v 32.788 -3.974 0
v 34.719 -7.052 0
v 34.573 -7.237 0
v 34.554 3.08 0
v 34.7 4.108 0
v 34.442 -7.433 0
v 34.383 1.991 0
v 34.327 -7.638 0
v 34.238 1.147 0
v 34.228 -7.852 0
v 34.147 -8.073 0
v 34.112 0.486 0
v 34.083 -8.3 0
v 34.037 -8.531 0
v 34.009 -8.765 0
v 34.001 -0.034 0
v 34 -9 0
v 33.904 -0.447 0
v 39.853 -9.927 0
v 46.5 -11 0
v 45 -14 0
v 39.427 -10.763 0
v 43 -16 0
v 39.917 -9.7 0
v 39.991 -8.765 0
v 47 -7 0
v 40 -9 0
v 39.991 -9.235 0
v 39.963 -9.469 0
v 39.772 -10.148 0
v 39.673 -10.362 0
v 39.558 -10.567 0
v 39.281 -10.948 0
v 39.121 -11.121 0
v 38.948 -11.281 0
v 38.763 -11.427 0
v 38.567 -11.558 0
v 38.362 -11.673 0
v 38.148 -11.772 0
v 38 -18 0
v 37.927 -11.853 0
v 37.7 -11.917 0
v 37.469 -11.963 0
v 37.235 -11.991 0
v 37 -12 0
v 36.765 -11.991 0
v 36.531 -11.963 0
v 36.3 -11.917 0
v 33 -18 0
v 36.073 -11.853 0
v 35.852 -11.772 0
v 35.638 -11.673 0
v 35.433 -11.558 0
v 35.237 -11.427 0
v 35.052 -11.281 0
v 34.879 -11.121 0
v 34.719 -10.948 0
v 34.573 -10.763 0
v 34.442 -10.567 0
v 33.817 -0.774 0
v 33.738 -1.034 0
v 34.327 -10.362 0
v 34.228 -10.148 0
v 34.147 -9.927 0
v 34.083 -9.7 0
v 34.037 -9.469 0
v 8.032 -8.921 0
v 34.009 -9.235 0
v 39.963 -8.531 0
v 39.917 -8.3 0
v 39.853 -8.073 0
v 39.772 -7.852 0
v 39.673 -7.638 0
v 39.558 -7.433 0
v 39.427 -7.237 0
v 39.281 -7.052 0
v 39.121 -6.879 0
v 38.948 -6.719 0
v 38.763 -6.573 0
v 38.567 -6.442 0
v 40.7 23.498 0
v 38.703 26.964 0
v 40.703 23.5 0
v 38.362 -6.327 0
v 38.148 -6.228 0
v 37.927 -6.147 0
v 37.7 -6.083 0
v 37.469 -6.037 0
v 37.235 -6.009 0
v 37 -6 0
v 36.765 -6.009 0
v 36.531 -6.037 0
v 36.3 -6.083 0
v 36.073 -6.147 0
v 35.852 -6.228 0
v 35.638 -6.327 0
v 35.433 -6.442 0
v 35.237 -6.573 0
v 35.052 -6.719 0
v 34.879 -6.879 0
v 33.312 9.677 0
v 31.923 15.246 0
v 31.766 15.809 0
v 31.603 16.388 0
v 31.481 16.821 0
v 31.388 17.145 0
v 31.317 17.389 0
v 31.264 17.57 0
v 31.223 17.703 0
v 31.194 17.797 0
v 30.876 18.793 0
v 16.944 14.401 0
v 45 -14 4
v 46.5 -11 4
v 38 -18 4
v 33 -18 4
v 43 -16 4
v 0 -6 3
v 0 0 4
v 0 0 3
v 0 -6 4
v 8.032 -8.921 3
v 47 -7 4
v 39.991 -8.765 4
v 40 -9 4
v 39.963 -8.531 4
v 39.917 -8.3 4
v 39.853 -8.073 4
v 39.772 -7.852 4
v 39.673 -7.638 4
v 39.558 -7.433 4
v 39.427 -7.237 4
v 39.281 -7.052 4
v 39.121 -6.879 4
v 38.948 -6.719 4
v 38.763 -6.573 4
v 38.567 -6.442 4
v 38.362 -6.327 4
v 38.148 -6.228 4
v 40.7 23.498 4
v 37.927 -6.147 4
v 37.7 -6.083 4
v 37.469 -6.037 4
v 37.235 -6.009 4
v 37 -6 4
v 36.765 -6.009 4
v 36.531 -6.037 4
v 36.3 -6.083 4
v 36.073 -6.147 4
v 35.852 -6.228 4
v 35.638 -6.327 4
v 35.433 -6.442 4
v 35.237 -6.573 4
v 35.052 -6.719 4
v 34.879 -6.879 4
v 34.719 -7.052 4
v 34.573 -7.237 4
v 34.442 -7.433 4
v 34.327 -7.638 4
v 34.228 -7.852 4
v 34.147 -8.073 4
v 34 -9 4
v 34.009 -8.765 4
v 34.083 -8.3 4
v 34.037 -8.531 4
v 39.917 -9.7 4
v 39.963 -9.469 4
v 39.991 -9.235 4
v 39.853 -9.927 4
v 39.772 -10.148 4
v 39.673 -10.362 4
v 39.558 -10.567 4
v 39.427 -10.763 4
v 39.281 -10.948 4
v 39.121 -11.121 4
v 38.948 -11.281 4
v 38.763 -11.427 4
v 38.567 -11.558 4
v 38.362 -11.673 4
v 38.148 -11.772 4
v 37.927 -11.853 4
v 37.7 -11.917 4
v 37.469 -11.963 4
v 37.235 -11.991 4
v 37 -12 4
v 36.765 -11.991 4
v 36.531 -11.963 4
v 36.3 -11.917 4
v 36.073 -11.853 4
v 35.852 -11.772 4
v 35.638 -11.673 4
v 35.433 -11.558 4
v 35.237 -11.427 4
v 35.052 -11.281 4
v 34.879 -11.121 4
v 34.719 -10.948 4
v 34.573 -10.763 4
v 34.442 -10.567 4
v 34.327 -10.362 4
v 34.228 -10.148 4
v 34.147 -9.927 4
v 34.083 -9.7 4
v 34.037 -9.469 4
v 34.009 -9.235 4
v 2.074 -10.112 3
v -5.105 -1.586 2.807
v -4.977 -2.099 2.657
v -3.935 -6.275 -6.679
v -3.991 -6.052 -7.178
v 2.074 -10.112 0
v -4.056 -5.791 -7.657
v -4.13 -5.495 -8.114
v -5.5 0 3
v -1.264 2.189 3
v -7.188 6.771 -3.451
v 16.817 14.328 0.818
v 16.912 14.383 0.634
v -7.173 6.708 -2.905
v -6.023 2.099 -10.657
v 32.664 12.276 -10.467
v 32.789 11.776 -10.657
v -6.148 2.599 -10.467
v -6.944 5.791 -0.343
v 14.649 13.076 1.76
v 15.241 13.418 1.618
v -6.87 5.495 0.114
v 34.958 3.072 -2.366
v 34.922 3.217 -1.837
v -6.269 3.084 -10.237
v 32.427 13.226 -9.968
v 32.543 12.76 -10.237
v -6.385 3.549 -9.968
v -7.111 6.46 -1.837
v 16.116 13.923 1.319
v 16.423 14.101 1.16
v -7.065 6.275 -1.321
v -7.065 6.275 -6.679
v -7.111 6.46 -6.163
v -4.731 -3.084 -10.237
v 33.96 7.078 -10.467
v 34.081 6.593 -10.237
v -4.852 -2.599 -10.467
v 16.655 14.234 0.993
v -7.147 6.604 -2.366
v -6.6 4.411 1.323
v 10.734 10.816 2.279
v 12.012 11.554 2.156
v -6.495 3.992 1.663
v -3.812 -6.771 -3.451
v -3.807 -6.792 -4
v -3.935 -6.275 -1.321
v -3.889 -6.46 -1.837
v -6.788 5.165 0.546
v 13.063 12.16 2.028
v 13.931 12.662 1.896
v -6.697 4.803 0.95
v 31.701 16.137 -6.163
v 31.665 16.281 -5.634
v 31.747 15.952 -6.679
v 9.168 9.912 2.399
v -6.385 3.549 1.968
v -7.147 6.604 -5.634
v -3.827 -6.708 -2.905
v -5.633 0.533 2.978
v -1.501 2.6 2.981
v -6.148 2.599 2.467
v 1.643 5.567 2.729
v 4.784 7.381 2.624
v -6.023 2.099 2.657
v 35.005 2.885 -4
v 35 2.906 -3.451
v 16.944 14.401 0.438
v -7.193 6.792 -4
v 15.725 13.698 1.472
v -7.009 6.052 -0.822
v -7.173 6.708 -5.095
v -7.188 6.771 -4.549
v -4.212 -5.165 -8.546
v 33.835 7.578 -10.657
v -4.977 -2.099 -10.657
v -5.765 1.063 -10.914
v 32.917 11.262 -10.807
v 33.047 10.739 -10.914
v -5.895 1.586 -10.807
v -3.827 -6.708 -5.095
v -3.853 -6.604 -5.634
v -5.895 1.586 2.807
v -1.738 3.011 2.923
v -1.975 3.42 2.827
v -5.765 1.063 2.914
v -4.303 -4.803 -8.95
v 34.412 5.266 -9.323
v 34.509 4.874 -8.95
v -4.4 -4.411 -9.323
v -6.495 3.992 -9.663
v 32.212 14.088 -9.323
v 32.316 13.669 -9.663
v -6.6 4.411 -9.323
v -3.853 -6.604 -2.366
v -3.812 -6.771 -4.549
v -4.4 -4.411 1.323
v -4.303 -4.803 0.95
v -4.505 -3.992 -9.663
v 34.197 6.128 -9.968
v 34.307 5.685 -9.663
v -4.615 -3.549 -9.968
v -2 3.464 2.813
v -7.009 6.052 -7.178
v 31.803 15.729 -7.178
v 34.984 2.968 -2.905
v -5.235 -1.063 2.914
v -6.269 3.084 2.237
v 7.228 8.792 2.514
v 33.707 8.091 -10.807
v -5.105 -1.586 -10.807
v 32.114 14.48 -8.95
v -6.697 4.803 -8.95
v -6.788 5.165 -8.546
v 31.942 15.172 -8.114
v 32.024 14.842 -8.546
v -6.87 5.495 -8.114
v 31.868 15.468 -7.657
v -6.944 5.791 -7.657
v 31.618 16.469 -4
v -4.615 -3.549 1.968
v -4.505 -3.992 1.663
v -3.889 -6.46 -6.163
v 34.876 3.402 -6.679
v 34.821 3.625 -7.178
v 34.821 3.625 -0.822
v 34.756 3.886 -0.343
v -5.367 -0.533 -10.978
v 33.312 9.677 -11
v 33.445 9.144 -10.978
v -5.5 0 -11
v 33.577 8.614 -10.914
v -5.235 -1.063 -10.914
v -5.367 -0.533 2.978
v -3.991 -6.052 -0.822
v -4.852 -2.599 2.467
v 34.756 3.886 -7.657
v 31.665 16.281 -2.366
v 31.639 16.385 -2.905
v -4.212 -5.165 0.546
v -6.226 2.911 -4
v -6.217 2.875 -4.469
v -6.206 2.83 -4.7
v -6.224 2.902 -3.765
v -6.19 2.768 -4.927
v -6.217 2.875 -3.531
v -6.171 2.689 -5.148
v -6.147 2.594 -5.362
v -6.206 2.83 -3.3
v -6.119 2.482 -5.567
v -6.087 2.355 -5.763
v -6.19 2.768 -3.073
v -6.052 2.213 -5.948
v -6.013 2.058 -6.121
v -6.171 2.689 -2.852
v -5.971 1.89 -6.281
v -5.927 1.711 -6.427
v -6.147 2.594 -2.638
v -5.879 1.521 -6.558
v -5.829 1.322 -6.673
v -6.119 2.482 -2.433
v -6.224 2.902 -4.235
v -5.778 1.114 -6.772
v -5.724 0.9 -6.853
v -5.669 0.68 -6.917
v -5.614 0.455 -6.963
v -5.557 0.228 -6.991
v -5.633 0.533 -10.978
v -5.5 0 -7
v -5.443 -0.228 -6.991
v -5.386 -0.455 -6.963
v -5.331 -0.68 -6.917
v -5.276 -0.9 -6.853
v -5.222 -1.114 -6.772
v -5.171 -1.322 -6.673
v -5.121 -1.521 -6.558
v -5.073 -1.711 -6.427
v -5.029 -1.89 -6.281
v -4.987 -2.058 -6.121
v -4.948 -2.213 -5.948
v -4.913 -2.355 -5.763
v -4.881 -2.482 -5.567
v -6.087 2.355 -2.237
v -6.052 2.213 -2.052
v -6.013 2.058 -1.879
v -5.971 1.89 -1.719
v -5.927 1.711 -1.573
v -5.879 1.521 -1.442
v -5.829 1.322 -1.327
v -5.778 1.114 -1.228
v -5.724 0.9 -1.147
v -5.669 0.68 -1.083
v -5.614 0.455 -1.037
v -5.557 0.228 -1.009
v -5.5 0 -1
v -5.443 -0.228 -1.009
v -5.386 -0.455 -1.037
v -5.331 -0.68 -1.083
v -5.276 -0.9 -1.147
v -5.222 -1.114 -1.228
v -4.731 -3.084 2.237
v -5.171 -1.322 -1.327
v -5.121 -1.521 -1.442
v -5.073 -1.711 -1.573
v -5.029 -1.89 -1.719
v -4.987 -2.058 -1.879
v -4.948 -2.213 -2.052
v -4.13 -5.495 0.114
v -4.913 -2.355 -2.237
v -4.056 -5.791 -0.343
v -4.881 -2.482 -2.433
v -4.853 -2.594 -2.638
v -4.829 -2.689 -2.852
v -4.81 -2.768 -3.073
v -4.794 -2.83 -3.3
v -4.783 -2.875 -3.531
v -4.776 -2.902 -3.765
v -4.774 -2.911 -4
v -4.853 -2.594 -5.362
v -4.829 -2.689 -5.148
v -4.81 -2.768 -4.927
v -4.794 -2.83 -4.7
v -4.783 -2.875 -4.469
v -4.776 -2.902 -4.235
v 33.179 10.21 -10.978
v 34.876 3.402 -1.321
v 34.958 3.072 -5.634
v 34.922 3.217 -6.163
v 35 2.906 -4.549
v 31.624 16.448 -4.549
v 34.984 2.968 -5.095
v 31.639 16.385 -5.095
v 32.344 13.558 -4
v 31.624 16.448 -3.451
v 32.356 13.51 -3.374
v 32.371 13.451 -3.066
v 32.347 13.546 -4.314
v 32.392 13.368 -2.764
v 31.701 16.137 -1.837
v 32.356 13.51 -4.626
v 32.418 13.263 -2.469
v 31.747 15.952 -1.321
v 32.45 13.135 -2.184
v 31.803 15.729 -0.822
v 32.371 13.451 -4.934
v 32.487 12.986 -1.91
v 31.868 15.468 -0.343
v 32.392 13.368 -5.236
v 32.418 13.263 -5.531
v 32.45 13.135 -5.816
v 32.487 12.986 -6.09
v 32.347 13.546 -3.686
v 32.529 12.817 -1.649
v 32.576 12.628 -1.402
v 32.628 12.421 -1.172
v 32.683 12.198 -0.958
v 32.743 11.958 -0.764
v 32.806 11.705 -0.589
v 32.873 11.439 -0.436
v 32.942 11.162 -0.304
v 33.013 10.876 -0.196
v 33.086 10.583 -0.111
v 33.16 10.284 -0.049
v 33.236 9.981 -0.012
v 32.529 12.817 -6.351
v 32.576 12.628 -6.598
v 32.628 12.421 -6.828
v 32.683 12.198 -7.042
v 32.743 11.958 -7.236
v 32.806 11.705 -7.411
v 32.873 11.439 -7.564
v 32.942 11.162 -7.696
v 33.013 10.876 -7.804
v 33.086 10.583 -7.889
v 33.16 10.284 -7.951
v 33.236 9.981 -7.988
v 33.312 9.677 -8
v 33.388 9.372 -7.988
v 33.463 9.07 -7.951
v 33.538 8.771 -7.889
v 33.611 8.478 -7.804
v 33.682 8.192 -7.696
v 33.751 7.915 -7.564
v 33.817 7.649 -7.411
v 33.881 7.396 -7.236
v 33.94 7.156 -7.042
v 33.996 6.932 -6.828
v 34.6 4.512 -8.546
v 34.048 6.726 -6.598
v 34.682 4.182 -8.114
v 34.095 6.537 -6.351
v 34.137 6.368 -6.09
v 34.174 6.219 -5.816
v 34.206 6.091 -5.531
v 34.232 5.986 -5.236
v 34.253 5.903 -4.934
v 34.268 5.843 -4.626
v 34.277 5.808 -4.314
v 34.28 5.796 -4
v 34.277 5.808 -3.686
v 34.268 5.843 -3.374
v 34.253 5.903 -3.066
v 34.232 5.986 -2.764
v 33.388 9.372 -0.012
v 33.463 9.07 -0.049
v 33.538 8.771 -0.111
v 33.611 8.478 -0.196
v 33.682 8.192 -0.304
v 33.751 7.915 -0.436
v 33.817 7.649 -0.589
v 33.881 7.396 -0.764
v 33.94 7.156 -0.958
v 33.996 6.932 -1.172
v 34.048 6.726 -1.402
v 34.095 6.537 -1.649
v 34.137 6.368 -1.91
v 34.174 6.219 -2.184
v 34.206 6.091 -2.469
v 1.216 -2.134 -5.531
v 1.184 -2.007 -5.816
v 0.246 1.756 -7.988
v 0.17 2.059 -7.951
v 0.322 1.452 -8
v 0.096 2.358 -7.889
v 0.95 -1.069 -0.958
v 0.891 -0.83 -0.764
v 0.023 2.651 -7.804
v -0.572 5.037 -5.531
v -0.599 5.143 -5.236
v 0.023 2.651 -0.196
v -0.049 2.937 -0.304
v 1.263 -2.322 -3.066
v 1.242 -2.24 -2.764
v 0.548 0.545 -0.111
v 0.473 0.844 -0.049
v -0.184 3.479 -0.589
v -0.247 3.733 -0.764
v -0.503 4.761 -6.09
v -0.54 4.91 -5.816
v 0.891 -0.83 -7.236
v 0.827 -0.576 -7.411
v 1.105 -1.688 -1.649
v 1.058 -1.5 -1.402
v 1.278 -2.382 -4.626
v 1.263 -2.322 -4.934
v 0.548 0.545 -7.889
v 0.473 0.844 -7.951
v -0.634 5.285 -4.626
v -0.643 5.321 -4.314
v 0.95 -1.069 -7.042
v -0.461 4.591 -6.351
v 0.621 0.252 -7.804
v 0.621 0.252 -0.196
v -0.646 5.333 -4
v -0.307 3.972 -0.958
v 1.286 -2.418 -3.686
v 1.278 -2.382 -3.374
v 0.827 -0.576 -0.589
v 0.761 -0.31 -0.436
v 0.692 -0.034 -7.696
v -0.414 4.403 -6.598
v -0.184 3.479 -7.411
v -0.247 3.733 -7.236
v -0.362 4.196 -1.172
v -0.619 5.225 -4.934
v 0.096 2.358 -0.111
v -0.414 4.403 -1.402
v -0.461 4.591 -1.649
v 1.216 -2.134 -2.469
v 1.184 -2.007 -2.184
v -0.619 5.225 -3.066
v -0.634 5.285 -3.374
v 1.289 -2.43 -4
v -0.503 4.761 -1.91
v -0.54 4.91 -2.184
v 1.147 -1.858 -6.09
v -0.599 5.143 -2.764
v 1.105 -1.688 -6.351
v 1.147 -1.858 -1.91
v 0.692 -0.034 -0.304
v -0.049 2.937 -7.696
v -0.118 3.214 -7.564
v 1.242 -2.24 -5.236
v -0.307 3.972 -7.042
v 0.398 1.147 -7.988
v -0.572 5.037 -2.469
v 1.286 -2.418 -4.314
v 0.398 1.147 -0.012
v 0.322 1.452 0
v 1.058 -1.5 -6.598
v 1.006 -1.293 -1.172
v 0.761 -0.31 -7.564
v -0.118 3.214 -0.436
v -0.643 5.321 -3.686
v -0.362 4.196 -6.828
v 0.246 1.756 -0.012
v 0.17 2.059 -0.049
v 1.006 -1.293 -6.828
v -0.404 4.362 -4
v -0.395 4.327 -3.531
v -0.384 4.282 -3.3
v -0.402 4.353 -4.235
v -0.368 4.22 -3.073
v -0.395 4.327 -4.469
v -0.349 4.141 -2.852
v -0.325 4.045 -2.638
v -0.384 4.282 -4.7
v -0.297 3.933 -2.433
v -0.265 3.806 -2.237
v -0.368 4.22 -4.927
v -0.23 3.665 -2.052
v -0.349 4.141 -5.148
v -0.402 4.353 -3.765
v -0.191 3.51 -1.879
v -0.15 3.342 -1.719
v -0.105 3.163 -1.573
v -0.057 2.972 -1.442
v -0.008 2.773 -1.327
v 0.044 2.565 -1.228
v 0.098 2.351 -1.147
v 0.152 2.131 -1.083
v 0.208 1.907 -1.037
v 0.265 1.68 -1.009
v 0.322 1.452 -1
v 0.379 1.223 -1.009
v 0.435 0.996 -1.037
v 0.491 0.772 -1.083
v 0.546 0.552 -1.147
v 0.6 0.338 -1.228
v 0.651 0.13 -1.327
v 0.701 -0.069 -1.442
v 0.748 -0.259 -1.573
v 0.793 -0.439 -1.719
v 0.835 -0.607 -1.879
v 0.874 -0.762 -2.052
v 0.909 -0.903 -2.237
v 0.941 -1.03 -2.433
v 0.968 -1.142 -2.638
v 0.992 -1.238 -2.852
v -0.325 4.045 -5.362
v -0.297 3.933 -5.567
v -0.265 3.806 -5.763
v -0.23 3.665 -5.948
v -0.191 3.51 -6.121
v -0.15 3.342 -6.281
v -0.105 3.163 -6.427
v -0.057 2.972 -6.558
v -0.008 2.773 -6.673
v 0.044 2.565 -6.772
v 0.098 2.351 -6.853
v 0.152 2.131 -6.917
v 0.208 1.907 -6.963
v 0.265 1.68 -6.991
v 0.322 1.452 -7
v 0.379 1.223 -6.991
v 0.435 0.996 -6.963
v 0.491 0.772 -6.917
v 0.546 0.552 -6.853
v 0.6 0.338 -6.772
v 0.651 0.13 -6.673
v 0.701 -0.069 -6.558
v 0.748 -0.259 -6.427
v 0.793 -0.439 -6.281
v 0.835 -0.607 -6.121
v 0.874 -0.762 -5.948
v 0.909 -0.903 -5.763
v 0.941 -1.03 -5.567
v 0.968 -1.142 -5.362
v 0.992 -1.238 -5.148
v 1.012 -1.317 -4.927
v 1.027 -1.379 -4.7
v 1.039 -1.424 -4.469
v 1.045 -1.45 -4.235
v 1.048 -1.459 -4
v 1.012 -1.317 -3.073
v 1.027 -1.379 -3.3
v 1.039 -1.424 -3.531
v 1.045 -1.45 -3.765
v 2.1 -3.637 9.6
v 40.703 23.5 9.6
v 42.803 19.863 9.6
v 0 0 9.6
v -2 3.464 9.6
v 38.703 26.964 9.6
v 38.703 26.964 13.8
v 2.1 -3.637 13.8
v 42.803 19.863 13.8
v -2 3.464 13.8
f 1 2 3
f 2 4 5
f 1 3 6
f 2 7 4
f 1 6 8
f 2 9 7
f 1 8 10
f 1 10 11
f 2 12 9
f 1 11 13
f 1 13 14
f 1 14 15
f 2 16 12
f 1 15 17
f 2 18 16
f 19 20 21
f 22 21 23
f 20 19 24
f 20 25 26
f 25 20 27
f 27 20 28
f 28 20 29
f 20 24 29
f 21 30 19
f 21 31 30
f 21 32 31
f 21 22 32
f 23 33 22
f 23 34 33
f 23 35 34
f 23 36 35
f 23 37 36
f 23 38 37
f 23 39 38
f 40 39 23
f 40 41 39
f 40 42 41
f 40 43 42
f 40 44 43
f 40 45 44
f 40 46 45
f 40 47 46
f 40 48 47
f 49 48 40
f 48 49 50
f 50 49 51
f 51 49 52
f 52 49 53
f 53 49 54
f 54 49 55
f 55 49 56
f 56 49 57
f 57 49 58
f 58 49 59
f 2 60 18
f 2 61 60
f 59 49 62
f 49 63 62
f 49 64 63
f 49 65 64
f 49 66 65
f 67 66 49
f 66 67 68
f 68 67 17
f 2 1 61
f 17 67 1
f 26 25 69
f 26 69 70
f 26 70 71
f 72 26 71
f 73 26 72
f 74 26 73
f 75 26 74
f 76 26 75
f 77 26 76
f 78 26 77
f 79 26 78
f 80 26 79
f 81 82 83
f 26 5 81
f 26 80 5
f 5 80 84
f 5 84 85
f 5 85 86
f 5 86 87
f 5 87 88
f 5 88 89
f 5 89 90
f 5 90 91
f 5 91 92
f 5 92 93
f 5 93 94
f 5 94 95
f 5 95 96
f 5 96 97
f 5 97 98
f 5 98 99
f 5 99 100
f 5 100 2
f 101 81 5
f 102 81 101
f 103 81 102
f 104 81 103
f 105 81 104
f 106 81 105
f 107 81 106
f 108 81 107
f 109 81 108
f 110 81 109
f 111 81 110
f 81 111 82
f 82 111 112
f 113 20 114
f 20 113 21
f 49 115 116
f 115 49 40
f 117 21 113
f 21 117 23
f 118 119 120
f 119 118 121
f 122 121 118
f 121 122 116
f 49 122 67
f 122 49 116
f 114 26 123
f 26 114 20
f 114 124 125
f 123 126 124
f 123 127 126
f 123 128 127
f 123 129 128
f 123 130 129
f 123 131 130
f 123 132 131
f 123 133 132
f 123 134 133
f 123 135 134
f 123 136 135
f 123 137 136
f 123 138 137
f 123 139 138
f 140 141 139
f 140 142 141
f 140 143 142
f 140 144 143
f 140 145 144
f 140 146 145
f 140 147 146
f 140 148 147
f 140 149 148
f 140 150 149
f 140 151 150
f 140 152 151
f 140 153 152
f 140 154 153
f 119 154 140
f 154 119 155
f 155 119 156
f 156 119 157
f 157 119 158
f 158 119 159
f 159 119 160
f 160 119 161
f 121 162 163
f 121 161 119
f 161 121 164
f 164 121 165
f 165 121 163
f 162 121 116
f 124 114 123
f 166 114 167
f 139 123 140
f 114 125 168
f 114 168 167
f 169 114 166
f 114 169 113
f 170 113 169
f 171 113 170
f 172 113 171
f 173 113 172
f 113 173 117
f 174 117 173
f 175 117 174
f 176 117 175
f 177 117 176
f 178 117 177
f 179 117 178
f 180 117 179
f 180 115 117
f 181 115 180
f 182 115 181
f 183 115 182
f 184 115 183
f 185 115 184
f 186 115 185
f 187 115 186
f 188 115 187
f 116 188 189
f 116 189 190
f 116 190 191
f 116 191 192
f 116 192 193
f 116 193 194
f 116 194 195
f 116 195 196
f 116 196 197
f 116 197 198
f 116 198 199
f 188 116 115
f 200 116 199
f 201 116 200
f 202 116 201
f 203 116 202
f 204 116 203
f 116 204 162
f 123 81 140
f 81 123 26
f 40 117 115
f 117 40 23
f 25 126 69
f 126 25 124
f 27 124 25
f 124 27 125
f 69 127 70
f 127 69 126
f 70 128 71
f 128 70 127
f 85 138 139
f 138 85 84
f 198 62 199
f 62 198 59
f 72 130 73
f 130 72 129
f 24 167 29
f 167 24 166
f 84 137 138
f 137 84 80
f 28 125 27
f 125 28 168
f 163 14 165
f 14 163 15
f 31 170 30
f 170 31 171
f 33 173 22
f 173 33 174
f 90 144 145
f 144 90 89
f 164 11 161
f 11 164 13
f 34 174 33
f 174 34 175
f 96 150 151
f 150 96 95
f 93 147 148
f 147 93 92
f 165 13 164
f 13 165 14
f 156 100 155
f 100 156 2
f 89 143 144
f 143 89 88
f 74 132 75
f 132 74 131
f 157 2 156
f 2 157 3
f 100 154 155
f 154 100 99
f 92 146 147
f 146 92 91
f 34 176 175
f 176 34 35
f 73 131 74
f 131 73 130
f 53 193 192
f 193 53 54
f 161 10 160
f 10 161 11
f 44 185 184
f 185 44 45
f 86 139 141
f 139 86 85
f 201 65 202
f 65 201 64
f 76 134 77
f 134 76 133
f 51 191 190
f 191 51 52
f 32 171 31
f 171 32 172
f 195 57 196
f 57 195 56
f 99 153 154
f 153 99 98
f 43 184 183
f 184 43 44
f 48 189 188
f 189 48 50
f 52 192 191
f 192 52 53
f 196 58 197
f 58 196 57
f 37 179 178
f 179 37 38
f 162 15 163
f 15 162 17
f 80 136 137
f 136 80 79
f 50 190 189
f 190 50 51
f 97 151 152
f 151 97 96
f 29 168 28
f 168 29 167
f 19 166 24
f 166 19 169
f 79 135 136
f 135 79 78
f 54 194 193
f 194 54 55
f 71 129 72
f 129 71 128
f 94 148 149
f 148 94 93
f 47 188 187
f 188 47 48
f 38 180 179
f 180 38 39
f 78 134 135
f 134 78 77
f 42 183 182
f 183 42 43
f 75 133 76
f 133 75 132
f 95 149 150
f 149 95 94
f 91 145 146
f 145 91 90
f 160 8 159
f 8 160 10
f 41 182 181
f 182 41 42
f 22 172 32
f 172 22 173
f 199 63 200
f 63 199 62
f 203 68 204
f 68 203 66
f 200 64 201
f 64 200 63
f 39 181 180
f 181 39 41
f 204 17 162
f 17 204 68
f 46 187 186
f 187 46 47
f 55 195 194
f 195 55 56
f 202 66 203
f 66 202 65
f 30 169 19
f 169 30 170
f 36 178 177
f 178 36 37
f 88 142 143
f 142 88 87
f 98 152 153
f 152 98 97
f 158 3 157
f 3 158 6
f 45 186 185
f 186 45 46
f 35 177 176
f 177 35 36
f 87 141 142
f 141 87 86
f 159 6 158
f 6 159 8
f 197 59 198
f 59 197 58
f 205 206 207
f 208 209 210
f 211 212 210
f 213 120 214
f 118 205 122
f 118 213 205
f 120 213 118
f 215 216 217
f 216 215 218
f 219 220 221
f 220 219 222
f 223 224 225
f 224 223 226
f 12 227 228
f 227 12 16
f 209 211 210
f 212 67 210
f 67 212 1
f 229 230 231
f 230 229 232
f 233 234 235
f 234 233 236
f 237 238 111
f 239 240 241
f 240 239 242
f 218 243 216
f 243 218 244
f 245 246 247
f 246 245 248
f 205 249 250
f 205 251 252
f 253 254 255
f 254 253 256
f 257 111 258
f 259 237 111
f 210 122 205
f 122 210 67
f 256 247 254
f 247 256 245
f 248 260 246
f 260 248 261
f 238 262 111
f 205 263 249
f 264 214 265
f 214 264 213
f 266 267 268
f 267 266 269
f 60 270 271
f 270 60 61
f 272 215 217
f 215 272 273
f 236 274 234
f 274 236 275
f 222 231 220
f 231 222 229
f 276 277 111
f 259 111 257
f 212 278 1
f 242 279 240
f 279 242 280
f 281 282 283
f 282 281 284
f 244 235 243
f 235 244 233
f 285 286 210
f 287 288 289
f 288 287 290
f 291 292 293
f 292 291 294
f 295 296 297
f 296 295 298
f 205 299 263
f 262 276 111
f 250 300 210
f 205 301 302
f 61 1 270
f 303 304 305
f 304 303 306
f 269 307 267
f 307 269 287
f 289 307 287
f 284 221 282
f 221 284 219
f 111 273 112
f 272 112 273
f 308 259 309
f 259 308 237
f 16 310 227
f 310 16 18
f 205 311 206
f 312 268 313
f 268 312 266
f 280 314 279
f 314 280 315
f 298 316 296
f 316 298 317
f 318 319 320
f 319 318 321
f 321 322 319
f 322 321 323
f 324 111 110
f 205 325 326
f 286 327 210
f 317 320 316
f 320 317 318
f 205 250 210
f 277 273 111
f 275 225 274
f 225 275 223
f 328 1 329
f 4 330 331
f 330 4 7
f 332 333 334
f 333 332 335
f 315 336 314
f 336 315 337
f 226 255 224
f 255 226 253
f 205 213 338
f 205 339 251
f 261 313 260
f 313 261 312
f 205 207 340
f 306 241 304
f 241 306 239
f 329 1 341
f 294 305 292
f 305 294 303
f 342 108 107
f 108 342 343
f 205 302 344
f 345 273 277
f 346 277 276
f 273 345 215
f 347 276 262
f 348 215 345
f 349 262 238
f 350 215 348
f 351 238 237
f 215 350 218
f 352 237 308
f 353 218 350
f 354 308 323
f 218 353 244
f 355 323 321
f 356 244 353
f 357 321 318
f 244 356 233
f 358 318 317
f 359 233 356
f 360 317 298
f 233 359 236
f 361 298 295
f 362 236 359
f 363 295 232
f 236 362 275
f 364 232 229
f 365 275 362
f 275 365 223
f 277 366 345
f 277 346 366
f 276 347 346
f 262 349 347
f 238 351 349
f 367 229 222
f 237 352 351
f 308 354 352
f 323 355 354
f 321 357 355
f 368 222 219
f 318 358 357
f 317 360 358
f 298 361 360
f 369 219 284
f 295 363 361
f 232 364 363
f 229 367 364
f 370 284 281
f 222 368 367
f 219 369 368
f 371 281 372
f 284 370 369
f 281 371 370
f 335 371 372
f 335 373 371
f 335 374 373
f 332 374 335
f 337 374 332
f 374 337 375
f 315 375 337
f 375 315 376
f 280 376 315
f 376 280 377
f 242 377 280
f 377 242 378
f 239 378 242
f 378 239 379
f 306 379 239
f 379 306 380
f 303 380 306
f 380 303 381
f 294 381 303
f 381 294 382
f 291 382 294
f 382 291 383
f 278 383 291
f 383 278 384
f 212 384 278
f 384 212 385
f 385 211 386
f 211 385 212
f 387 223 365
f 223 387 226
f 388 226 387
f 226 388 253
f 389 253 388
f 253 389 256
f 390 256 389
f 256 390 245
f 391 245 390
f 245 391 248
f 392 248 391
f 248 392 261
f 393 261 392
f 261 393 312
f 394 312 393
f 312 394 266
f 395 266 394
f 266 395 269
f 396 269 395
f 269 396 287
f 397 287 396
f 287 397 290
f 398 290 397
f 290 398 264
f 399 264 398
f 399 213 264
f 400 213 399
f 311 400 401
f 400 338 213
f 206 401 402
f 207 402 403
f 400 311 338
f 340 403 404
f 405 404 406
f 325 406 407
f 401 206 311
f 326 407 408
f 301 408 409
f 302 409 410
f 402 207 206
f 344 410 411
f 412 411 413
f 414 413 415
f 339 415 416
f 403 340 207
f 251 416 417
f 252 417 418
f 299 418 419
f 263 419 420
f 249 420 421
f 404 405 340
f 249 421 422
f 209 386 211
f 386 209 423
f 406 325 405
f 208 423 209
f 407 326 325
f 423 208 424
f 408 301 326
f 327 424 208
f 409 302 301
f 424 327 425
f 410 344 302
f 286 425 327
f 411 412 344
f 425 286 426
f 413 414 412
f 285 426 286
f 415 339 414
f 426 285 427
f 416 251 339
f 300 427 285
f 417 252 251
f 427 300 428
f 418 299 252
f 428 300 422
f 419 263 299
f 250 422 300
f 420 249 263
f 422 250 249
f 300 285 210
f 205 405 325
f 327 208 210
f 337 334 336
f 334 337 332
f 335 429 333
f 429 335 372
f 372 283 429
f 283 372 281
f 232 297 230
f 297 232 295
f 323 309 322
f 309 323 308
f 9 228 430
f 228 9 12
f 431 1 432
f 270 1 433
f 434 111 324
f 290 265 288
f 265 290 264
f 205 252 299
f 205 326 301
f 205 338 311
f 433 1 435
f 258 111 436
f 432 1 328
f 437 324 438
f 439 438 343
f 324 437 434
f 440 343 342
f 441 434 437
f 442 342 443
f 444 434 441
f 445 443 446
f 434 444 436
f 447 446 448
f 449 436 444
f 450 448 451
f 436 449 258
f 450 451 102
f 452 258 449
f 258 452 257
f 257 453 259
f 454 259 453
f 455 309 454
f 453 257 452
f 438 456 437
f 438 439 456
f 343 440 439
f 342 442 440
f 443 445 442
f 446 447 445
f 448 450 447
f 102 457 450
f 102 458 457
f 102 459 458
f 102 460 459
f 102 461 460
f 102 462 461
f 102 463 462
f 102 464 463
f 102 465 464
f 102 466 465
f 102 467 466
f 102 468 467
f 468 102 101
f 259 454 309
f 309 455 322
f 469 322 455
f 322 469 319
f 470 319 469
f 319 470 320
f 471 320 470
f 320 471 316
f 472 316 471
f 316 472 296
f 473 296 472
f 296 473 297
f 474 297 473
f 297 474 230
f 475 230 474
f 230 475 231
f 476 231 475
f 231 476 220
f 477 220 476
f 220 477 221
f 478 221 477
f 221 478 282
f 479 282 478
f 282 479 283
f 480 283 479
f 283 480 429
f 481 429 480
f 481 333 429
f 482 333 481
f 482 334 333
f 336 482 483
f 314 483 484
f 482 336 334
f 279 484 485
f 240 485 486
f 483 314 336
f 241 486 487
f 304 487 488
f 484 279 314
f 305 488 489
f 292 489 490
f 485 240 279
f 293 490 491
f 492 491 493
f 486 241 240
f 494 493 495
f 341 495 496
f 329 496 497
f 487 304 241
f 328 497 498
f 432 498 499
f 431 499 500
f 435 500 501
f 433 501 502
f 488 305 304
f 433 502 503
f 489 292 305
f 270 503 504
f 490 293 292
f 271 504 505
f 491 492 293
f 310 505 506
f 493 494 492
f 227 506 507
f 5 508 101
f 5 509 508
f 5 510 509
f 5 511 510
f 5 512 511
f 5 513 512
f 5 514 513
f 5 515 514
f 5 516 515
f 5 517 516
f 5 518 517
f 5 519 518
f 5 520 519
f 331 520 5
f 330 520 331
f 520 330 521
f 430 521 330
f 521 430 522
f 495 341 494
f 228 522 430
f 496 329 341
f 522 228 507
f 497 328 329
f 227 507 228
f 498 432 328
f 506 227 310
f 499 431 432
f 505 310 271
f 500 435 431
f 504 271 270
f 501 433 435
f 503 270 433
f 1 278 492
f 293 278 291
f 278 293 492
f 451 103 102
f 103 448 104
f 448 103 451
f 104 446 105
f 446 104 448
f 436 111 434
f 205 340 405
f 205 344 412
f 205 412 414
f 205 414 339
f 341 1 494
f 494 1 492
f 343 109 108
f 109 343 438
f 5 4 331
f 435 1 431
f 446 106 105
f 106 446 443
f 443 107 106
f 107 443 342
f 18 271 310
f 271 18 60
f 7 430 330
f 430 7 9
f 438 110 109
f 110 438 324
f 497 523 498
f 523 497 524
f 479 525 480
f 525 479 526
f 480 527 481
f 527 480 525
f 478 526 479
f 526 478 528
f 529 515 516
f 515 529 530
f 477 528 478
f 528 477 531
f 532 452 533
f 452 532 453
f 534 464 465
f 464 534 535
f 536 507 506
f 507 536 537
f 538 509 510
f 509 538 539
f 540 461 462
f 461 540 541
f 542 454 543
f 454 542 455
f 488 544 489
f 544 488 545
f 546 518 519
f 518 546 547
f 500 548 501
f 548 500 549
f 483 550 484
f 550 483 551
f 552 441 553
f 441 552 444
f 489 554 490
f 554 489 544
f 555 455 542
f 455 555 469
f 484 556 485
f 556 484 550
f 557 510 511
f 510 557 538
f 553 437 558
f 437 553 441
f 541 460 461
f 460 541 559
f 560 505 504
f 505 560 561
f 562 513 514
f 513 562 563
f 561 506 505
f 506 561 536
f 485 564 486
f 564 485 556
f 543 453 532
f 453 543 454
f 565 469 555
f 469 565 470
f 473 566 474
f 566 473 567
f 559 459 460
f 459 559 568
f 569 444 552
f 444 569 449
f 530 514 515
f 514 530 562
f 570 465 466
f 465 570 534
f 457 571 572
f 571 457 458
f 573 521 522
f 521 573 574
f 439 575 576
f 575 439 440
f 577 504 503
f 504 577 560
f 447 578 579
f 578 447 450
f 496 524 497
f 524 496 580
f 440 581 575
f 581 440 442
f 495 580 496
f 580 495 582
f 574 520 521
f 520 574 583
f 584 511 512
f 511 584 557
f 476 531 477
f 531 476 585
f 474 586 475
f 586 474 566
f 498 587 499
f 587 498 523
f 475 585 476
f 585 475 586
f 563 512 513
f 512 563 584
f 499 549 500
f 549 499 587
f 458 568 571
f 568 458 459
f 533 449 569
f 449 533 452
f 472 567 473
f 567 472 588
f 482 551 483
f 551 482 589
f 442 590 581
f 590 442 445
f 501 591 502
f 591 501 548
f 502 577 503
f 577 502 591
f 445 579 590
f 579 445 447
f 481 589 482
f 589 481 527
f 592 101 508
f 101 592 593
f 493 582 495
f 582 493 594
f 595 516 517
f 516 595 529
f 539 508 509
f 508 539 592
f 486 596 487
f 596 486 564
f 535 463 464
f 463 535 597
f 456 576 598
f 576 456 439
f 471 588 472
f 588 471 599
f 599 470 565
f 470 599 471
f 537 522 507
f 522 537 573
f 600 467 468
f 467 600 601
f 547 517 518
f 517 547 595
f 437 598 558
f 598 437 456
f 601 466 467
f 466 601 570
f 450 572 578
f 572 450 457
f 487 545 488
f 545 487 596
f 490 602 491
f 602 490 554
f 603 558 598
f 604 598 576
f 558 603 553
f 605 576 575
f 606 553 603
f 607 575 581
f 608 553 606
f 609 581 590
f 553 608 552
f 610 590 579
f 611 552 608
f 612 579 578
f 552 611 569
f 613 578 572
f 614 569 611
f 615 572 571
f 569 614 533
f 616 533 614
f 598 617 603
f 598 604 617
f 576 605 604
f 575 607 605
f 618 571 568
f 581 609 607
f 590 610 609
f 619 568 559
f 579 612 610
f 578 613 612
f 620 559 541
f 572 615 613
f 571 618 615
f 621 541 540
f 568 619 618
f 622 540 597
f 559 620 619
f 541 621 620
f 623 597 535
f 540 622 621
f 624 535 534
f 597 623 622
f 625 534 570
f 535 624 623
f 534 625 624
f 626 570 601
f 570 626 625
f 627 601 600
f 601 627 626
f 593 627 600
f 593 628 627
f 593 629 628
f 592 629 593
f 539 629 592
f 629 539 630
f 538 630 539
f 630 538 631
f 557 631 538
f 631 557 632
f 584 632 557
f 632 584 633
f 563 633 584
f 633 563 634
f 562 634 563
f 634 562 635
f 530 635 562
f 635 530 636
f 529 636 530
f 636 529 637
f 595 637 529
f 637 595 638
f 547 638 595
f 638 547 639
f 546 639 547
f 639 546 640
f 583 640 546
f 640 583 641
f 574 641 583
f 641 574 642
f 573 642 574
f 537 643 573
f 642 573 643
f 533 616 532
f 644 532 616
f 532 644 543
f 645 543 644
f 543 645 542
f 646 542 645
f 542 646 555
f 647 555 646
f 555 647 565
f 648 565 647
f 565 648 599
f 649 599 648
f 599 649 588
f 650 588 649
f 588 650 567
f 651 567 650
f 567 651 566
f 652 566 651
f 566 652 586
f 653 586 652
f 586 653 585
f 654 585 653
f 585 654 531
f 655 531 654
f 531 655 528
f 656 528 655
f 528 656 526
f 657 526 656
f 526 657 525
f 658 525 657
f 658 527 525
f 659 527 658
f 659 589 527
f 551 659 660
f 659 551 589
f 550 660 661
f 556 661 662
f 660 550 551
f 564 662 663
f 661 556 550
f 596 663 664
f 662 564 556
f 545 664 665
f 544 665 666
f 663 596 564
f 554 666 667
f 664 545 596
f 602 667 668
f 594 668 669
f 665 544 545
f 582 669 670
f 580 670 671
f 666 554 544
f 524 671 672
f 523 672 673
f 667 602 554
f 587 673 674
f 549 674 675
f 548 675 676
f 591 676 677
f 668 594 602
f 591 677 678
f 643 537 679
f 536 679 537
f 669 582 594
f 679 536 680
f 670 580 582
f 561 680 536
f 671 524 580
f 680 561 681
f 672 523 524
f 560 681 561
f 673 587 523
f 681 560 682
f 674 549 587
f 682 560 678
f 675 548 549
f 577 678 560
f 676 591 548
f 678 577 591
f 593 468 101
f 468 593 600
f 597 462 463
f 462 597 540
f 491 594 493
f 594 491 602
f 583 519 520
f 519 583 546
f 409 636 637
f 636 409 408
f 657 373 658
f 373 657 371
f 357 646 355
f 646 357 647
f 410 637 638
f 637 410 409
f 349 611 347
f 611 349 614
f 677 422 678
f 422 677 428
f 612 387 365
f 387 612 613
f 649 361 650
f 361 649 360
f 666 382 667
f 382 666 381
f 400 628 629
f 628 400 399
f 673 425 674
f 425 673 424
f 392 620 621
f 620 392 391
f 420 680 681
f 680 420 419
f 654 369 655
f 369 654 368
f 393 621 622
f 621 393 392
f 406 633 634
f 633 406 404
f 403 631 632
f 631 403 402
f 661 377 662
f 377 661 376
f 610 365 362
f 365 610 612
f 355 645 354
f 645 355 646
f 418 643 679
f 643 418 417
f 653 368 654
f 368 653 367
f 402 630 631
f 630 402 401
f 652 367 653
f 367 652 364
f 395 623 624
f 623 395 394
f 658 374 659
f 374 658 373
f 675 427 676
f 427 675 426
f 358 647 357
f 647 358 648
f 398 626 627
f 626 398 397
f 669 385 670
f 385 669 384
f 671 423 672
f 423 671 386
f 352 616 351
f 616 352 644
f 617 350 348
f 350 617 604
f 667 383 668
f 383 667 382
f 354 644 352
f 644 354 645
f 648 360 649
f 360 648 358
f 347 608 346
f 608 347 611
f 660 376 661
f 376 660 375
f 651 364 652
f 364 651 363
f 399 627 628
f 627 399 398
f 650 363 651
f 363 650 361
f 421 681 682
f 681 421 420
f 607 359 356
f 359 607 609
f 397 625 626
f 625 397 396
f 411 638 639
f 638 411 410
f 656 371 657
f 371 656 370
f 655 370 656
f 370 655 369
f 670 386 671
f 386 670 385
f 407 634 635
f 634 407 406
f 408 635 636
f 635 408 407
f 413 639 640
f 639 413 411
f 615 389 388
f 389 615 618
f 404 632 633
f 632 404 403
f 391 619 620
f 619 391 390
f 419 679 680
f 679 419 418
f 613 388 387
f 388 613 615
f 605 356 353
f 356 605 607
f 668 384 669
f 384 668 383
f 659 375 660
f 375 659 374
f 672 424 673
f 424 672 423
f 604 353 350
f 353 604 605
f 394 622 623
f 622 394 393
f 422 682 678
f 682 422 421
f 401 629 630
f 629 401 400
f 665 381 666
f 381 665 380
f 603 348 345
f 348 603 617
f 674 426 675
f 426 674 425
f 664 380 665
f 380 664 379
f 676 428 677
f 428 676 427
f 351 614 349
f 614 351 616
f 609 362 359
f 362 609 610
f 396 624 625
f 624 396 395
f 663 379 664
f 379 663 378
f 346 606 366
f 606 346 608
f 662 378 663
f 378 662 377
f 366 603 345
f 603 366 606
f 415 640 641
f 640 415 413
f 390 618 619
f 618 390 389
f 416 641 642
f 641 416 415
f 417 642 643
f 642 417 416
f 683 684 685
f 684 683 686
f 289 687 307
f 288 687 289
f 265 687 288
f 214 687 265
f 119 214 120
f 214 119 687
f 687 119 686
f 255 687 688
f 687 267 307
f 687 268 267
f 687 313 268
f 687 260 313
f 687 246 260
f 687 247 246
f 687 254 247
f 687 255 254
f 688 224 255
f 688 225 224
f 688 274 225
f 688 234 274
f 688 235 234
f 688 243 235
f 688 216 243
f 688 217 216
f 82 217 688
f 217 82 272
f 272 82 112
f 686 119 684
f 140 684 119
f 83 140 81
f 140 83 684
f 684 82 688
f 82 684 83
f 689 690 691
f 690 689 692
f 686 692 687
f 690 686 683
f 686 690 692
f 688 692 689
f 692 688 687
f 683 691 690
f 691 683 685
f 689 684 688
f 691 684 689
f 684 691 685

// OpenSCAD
fork_thickness = 5.6;


mount_thickness_inner = 4.2;
mount_plate_thickness = 4;

mount_bolt_hole_dia = 6;
mount_bolt_hole_offset_rear = 37;
mount_bolt_hole_offset_bottom = 58;
mount_bolt_head_clearance_dia = 0;

cable_tunnel_length = 40;
cable_tunnel_thickness = 3;
cable_dia_outer = 8;
cable_dia_inner = 6;
cable_tunnel_angle = 30;

$fn = 80;

cable_tunnel_dia_outer = cable_dia_outer + cable_tunnel_thickness * 2;

    // mount plate

    render()
    difference() {
        //rotate([0, 0, mount_angle_c - 90])
        translate([0, -20, 0])
        linear_extrude(height=mount_plate_thickness)
        polygon([
            [0, 0],
            [0, 14],
            [33, 2],
            [38, 2],
            [43, 4],
            [45, 6],
            [46.5, 9],
            [47, 13],
            [40.7, 43.5],
            [0, 24]
            
        ]);
        translate([mount_bolt_hole_offset_rear, 49 - mount_bolt_hole_offset_bottom, 0])
        cylinder(h=mount_plate_thickness, d=mount_bolt_hole_dia);
    }

    rotate([0, 0, 30])
    cube([47, mount_plate_thickness, mount_plate_thickness + fork_thickness]);

    translate([0, -0, mount_plate_thickness + fork_thickness])
    rotate([0, 0, 30])
    translate([0, -mount_thickness_inner, 0])
    cube([47, mount_plate_thickness + mount_thickness_inner, mount_thickness_inner]);

    // cable tunnel

    translate([-5.5, 0, -cable_tunnel_dia_outer/2 + cable_tunnel_thickness])
    rotate([5, 90, 19])
    render()
    difference() {

        hull() {
            translate([-(11-mount_plate_thickness), 0, 2])
            rotate([-14, 0, 0])
            rotate([0, -90, 180])
            linear_extrude(height=7-mount_plate_thickness)
            translate([0, 0, 10])
            polygon([
                    [0, 0],
                    [39, 0],
                    [30, 21],
                    [0, 12]
                ]);

            // draw a cylinder for the cable tunnel
            cylinder(h=cable_tunnel_length, d=cable_tunnel_dia_outer);



        }

        // carve room for the bolt head
        translate([-mount_plate_thickness, -19.3, 38])
        rotate([0, 90, 0])
        cylinder(h=cable_dia_outer, d=mount_bolt_head_clearance_dia);

        // hone the outer cable
        translate([0, 0, cable_tunnel_thickness * 2])
        cylinder(h=cable_tunnel_length - cable_tunnel_thickness * 2, d=cable_dia_outer);

        // hone the inner cable
        cylinder(h=cable_tunnel_thickness * 2, d=cable_dia_inner);
    }
